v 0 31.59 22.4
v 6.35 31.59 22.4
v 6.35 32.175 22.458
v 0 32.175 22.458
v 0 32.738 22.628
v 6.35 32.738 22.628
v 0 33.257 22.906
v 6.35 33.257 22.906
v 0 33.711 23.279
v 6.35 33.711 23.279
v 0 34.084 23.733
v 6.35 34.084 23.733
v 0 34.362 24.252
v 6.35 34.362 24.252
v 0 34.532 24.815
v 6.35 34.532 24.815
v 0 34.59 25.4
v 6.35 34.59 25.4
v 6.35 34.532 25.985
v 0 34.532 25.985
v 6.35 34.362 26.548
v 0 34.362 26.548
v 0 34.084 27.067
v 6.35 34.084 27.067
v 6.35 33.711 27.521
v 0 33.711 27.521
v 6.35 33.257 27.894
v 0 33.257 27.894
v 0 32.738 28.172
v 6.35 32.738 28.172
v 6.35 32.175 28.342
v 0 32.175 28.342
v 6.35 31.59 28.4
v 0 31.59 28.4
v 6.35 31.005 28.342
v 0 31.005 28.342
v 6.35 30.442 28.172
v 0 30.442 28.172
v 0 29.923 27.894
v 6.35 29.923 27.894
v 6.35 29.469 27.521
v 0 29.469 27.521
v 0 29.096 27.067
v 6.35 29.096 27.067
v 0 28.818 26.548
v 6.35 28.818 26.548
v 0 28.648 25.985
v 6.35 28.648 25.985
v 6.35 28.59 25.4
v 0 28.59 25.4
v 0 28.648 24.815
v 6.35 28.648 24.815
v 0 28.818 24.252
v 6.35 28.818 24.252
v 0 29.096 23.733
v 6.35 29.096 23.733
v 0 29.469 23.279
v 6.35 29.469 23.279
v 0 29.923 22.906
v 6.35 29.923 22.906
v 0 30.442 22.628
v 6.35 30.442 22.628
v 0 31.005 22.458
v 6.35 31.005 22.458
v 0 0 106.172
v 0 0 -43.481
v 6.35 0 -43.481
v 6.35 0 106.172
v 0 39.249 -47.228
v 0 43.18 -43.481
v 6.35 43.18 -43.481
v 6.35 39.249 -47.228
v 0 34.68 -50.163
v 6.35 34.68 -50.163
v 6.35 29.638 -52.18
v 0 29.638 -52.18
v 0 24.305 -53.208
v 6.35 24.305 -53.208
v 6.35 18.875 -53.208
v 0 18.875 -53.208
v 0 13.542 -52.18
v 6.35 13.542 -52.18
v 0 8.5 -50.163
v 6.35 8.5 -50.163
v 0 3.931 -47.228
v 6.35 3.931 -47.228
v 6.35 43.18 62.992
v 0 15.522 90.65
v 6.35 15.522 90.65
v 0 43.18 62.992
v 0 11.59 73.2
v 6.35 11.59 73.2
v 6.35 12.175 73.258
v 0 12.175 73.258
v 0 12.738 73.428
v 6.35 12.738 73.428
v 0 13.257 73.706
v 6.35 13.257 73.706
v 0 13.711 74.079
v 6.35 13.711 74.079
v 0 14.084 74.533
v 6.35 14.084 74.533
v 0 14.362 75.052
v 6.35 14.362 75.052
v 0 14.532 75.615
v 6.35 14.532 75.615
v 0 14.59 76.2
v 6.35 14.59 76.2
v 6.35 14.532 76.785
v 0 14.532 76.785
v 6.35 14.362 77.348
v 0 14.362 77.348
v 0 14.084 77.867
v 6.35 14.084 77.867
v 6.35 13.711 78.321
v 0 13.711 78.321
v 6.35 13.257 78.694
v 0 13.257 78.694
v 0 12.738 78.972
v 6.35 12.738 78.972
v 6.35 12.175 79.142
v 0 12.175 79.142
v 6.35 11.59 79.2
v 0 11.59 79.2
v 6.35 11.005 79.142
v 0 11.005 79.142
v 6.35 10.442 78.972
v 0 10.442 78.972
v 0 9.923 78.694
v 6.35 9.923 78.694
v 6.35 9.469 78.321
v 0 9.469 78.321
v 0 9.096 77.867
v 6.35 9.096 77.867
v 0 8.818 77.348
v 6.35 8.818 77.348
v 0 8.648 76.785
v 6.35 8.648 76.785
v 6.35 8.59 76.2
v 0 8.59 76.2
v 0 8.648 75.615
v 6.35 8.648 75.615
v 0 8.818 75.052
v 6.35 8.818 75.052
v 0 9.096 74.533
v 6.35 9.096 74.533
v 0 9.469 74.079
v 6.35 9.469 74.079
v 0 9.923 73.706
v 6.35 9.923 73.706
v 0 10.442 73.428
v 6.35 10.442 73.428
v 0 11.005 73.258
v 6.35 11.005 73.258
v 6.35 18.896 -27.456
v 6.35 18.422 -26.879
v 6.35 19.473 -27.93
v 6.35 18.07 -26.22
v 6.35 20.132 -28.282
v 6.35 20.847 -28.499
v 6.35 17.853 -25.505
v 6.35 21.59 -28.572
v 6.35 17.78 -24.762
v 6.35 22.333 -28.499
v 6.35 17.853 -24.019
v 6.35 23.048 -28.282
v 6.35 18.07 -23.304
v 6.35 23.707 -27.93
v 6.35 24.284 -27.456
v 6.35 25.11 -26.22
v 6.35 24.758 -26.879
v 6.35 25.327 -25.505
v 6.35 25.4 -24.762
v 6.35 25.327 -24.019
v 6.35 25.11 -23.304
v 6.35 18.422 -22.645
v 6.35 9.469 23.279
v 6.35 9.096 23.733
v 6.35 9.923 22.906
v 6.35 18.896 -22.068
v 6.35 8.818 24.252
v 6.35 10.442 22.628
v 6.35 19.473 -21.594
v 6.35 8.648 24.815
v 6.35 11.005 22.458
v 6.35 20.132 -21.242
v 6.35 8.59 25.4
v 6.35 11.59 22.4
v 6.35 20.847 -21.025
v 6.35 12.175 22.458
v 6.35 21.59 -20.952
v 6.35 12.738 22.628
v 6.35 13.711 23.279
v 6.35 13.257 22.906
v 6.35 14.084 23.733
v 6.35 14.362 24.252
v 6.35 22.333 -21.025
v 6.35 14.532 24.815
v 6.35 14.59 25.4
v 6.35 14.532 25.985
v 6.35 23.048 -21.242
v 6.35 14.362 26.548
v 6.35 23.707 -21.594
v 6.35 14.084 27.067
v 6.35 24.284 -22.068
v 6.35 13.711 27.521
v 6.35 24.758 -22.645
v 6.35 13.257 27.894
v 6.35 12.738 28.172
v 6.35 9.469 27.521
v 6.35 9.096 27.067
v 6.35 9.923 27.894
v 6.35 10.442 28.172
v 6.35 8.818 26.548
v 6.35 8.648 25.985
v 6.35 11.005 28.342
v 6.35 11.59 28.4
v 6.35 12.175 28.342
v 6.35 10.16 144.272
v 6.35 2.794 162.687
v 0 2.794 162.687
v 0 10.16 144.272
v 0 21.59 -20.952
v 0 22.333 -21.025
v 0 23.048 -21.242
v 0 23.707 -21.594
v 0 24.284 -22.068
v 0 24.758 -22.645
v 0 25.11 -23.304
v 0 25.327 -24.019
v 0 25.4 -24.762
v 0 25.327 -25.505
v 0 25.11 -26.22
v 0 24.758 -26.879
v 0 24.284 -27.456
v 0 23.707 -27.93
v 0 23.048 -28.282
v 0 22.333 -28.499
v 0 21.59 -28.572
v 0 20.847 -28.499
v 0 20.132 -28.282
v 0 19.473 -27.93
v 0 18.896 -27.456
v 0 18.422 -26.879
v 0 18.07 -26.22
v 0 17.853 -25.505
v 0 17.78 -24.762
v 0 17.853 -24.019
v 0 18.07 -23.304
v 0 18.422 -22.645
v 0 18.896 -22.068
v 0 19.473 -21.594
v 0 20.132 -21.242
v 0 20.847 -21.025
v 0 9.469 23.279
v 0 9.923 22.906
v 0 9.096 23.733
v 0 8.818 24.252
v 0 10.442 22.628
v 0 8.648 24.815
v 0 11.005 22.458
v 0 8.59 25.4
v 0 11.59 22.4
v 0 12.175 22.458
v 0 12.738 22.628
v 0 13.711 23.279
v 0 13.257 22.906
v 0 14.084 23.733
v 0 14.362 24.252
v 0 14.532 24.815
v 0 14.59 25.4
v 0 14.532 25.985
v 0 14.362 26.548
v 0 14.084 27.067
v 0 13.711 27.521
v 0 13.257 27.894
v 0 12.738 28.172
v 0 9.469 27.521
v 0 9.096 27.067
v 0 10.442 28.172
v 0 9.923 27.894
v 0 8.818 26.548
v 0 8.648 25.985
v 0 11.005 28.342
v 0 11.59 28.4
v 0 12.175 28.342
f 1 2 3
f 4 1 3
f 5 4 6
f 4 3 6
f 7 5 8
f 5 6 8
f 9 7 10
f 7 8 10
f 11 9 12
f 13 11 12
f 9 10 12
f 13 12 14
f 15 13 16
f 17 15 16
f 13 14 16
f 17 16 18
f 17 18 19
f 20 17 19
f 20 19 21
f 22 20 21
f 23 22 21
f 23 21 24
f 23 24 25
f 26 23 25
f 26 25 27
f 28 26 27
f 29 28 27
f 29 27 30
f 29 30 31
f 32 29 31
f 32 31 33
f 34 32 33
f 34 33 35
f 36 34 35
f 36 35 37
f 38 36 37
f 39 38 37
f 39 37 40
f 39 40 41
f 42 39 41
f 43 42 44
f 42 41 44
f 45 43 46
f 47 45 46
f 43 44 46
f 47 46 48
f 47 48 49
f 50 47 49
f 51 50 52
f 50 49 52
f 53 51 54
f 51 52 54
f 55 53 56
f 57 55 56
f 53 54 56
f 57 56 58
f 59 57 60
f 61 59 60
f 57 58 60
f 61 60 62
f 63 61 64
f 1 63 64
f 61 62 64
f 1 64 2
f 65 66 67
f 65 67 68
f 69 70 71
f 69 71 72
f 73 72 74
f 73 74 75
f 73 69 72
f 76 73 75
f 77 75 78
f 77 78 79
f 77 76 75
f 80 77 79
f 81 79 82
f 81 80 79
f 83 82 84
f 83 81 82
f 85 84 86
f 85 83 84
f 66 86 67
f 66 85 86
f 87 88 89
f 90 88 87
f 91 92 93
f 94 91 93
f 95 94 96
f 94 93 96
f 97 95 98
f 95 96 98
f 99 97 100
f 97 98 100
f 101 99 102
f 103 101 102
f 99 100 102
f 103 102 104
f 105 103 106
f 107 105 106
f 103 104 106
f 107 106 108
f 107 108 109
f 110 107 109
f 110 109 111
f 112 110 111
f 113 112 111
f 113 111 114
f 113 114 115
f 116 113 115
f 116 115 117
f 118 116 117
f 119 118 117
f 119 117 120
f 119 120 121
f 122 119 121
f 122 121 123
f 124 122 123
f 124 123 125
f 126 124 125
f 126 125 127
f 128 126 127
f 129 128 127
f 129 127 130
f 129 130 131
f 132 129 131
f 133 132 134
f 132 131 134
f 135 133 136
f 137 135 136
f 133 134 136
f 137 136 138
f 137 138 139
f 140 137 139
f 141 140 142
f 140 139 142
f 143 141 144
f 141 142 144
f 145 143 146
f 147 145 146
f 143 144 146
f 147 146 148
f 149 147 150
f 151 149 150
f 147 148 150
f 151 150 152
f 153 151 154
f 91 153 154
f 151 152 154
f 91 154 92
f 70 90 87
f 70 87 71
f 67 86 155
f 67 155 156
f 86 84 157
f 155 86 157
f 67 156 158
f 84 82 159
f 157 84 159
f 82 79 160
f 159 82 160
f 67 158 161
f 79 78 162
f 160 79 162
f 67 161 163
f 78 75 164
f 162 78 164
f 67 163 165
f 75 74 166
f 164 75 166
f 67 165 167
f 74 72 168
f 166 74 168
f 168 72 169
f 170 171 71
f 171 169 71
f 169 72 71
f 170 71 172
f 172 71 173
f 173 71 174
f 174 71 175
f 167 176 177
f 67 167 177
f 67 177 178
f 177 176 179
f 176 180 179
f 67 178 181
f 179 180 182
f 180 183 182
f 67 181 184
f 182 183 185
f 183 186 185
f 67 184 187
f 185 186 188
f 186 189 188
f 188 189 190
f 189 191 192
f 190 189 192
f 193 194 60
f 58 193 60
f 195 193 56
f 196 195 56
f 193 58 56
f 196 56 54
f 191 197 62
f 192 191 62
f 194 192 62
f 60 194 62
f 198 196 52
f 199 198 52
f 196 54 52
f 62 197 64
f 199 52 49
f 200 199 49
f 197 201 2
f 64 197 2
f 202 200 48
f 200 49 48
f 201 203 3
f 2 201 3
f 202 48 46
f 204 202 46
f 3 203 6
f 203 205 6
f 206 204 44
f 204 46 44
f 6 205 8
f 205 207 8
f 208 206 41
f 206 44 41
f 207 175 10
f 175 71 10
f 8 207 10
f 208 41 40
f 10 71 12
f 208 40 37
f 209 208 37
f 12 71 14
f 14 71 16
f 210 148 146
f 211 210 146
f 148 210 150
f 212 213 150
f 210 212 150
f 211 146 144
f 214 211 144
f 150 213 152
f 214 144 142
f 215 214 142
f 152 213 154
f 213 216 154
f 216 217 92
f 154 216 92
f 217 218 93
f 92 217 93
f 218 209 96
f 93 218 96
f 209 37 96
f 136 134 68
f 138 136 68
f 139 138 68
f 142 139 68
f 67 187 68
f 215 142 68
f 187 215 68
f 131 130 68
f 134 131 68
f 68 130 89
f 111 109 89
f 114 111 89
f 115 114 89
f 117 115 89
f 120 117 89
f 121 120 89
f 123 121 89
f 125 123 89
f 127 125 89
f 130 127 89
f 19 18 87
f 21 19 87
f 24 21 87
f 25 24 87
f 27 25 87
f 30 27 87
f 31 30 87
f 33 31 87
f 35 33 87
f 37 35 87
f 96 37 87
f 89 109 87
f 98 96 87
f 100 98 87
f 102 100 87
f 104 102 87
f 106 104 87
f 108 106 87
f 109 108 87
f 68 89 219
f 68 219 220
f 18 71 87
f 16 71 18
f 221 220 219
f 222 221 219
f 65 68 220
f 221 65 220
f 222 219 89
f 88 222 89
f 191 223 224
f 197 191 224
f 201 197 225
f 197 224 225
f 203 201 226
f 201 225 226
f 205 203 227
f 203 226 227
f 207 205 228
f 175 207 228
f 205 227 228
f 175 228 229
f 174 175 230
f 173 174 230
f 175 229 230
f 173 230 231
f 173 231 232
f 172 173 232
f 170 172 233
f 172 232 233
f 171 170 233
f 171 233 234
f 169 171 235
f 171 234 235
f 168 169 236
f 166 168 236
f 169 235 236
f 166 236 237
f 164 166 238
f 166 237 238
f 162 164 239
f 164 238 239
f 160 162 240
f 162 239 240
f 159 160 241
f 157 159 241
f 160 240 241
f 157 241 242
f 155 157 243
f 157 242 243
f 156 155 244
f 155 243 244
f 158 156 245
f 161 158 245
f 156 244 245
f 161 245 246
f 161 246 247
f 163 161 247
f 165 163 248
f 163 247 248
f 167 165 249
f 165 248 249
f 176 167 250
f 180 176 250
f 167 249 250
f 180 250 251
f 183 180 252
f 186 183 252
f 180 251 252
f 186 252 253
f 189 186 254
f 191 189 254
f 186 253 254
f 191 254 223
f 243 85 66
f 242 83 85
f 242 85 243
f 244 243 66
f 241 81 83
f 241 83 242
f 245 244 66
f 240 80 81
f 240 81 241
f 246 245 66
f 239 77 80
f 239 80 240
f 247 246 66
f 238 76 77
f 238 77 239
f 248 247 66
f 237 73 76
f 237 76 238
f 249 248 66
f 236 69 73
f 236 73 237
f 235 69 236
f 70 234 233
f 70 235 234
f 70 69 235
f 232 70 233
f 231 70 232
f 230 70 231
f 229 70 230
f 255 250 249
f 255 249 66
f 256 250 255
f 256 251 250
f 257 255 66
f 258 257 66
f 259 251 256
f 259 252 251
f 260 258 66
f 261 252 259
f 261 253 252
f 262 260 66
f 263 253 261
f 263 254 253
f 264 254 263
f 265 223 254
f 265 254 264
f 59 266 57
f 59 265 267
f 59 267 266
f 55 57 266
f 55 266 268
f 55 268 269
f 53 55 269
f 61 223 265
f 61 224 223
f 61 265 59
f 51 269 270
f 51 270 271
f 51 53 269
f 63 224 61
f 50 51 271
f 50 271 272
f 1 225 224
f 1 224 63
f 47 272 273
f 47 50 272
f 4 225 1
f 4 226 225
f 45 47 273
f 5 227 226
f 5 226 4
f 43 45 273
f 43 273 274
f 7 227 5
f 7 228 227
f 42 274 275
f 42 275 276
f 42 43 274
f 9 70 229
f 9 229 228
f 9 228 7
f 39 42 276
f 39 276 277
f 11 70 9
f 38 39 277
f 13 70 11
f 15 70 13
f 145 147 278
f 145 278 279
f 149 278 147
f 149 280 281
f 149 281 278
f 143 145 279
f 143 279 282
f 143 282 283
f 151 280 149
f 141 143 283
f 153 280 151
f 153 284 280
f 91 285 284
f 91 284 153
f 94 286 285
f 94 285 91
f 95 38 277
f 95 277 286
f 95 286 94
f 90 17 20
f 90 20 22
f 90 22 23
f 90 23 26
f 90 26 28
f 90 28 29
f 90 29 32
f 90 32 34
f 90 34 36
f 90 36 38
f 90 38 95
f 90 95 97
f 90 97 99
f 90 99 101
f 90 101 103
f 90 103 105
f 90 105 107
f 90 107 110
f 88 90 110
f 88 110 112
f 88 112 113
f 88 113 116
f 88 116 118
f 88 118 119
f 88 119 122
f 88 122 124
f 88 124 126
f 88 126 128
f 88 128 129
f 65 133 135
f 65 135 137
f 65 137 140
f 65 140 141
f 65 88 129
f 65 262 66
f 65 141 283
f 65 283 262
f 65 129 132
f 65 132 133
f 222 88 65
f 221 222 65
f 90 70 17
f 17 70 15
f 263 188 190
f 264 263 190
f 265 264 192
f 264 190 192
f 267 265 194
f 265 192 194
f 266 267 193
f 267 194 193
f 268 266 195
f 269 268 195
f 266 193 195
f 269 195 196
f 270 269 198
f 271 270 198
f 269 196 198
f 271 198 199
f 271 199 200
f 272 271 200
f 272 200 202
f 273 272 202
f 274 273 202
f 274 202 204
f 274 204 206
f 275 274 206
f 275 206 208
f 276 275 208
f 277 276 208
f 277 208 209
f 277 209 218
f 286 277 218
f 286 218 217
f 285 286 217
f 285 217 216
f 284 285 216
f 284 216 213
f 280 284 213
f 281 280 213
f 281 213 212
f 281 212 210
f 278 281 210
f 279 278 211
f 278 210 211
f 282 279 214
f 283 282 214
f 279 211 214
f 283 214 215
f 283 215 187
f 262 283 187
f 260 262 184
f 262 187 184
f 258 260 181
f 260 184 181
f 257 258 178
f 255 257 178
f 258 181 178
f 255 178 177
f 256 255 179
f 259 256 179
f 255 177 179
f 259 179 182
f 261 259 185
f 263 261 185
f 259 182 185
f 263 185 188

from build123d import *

# Parameters (mm, degrees)
BOSS_EXTRUDE1_DEPTH = 6.35
BOSS_EXTRUDE2_DEPTH = 6.35
CUT_EXTRUDE1_DEPTH  = 176.195383741
SKETCH4_R           = 3
CUT_EXTRUDE2_DEPTH  = 169.439588188
SKETCH5_R           = 3.81
BOSS_EXTRUDE3_DEPTH = 6.35


with BuildPart() as part:
    # Sketch1 → Boss-Extrude1 (new body)
    with BuildSketch(Plane(origin=(0, 0, 0), x_dir=(0, 0, -1), z_dir=(1, 0, 0))):
        with BuildLine():
            Line((-106.172, 0), (-62.992, 43.18))
            Line((-62.992, 43.18), (0, 43.18))
            Line((0, 43.18), (0, 40.64))
            ThreePointArc((0, 40.64), (-6.479930943, 21.59), (0, 2.54))
            Line((0, 2.54), (0, 0))
            Line((0, 0), (-106.172, 0))
        make_face()
    extrude(amount=BOSS_EXTRUDE1_DEPTH)

    # Sketch2 → Boss-Extrude2 (add)
    with BuildSketch(Plane(origin=(6.35, 0, 0), x_dir=(0, 0, -1), z_dir=(1, 0, 0))):
        Polygon((-68.072, 0), (-169.672, 0), (-144.272, 10.16), (-68.072, 17.78), align=None)
    extrude(amount=-BOSS_EXTRUDE2_DEPTH)

    # Sketch3 → Cut-Extrude1 (cut, through all)
    with BuildSketch(Plane(origin=(6.35, 0, 0), x_dir=(0, 0, -1), z_dir=(1, 0, 0))):
        Polygon((-106.172, 0), (-162.687, 2.794), (-169.672, 0), align=None)
    extrude(amount=-CUT_EXTRUDE1_DEPTH, mode=Mode.SUBTRACT)

    # Sketch4 → Cut-Extrude2 (cut, through all)
    with BuildSketch(Plane(origin=(6.35, 0, 0), x_dir=(0, 0, -1), z_dir=(1, 0, 0))):
        with Locations((-25.4, 31.59)):
            Circle(SKETCH4_R)
        with Locations((-25.4, 11.59)):
            Circle(SKETCH4_R)
        with Locations((-76.2, 11.59)):
            Circle(SKETCH4_R)
    extrude(amount=-CUT_EXTRUDE2_DEPTH, mode=Mode.SUBTRACT)

    # Sketch5 → Boss-Extrude3 (add)
    with BuildSketch(Plane.ZY):
        with BuildLine():
            Line((0, 43.18), (-43.481110833, 43.18))
            ThreePointArc((-43.481110833, 43.18), (-53.337069057, 21.59), (-43.481110833, 0))
            Line((-43.481110833, 0), (0, 0))
            Line((0, 0), (0, 2.54))
            ThreePointArc((0, 2.54), (6.479930943, 21.59), (0, 40.64))
            Line((0, 40.64), (0, 43.18))
        make_face()
        with Locations((-24.762069057, 21.59)):
            Circle(SKETCH5_R, mode=Mode.SUBTRACT)
    extrude(amount=-BOSS_EXTRUDE3_DEPTH)


solid = part.part
